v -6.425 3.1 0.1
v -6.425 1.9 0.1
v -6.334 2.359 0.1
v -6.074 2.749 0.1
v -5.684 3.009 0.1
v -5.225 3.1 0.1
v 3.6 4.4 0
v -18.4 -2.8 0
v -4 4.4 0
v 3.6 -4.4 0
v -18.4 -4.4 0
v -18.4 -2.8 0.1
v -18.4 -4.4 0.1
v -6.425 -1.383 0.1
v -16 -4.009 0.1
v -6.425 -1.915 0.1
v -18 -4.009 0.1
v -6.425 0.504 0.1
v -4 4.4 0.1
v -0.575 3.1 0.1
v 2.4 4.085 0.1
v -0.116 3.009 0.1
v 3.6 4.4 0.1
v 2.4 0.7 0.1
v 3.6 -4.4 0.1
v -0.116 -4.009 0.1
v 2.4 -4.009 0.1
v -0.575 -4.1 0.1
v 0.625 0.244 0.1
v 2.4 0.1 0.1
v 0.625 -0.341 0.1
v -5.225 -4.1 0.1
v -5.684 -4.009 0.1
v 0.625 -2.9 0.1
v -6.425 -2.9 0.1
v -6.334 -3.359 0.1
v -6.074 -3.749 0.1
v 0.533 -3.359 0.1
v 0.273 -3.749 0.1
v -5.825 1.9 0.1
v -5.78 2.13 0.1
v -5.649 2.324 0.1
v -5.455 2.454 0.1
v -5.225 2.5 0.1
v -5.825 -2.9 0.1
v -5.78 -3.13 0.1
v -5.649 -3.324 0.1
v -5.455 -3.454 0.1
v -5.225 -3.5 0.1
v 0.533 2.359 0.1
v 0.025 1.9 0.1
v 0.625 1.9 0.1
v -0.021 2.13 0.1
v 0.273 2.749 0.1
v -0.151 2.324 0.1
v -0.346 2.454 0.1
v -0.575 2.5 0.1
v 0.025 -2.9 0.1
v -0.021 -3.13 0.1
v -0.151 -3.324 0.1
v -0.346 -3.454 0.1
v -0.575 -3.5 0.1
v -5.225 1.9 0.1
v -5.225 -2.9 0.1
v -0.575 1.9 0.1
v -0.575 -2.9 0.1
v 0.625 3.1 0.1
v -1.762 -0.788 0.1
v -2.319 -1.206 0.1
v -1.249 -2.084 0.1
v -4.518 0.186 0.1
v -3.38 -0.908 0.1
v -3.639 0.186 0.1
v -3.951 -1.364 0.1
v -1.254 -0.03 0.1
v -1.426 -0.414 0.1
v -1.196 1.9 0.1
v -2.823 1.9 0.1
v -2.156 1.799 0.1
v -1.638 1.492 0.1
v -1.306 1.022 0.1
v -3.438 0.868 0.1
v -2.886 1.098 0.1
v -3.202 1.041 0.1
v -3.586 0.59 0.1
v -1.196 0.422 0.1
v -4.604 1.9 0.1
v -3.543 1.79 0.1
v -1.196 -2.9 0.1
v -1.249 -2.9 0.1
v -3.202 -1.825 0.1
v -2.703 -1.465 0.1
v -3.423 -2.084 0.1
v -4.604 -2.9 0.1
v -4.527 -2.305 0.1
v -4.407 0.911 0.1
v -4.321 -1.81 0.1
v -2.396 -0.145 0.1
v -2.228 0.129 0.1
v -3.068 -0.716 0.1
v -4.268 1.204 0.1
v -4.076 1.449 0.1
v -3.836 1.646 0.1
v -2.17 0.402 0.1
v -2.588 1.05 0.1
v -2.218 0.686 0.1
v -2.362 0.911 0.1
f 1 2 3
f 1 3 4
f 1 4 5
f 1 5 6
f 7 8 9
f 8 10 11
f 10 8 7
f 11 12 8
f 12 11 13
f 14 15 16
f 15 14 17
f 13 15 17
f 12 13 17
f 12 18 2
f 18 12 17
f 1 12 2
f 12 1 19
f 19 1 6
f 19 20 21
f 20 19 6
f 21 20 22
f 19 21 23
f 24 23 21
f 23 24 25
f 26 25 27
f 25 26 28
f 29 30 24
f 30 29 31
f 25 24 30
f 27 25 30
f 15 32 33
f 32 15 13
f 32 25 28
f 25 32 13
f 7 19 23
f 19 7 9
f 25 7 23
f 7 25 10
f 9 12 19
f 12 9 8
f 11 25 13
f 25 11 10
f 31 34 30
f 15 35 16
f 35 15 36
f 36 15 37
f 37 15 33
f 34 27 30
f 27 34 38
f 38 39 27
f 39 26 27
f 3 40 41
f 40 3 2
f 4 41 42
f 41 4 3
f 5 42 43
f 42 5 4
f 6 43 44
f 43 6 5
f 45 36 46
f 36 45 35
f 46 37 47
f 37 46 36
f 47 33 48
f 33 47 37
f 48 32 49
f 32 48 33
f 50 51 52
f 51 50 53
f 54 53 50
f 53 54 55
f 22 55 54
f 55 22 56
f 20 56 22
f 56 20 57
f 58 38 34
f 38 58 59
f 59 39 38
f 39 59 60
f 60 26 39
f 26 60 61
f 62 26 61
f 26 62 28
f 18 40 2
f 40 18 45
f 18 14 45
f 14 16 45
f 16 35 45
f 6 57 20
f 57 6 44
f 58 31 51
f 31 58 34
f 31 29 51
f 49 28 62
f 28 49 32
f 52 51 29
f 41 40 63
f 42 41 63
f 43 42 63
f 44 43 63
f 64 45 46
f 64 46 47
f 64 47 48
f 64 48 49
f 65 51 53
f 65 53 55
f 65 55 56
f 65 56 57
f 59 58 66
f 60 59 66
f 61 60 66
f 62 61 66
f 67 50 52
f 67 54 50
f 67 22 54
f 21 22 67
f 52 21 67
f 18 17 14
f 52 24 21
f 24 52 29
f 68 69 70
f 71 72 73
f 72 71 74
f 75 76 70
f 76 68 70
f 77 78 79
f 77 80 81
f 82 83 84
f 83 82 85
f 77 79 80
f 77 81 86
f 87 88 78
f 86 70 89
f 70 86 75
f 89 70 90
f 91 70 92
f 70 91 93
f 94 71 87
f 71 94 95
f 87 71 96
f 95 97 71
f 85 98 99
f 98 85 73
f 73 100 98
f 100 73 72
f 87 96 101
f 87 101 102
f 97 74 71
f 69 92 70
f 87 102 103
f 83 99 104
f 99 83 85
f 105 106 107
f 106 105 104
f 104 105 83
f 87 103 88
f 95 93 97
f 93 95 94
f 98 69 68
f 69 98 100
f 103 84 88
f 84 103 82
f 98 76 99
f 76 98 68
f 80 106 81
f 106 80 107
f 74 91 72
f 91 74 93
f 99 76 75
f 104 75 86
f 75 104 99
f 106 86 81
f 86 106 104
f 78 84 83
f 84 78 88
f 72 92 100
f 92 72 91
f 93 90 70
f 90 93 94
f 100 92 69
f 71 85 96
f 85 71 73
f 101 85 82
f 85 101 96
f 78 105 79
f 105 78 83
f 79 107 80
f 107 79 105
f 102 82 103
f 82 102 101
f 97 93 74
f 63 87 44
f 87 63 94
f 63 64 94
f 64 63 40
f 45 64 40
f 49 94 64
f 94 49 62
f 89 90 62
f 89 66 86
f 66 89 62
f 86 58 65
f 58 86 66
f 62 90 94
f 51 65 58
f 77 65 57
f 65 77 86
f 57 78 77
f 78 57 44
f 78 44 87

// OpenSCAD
// file: ../p/1-4ndis.scad
use <../lib.scad>
function ldraw_lib__1_4ndis() = [
// 0 Disc Negative 0.25
// 0 Name: 1-4ndis.dat
// 0 Author: James Jessiman
// 0 !LDRAW_ORG Primitive UPDATE 2012-01
// 0 !LICENSE Licensed under CC BY 2.0 and CC BY 4.0 : see CAreadme.txt
// 
// 0 BFC CERTIFY CCW
  [0,"BFC","CERTIFY"],
  [0,"BFC","CCW"],
// 
// 0 !HISTORY 2002-03-23 [sbliss] Added BFC Statement
// 0 !HISTORY 2002-04-25 [PTadmin] Official Update 2002-02
// 0 !HISTORY 2007-06-22 [PTadmin] Header formatted for Contributor Agreement
// 0 !HISTORY 2008-07-01 [PTadmin] Official Update 2008-01
// 0 !HISTORY 2012-02-16 [Philo] Changed to CCW
// 0 !HISTORY 2012-03-30 [PTadmin] Official Update 2012-01
// 
// 
// 3 16 0.9239 0 0.3827 1 0 0 1 0 1
  [3,16,0.9239,0,0.3827,1,0,0,1,0,1],
// 3 16 0.7071 0 0.7071 0.9239 0 0.3827 1 0 1
  [3,16,0.7071,0,0.7071,0.9239,0,0.3827,1,0,1],
// 3 16 0.3827 0 0.9239 0.7071 0 0.7071 1 0 1
  [3,16,0.3827,0,0.9239,0.7071,0,0.7071,1,0,1],
// 3 16 0 0 1 0.3827 0 0.9239 1 0 1
  [3,16,0,0,1,0.3827,0,0.9239,1,0,1],
];
module ldraw_lib__1_4ndis(step=0, col=false, unit=2/5, alt=false, line=0.2, solid=!$preview)
    makepoly(ldraw_lib__1_4ndis(), step=step, col=col, unit=unit, alt=alt, line=line, solid=solid);
ldraw_lib__1_4ndis(line=0.2);
// file: ../p/3-16ndis.scad
use <../lib.scad>
function ldraw_lib__3_16ndis() = [
// 0 Disc Negative 0.1875
// 0 Name: 3-16ndis.dat
// 0 Author: Guy Vivan [guyvivan]
// 0 !LDRAW_ORG Primitive UPDATE 2009-01
// 0 !LICENSE Licensed under CC BY 2.0 and CC BY 4.0 : see CAreadme.txt
// 
// 0 BFC CERTIFY CCW
  [0,"BFC","CERTIFY"],
  [0,"BFC","CCW"],
// 
// 0 !HISTORY 2009-05-02 [PTadmin] Official Update 2009-01
// 
// 
// 3 16 1 0 1 0.9239 0 0.3827 1 0 0
  [3,16,1,0,1,0.9239,0,0.3827,1,0,0],
// 3 16 1 0 1 0.7071 0 0.7071 0.9239 0 0.3827
  [3,16,1,0,1,0.7071,0,0.7071,0.9239,0,0.3827],
// 3 16 1 0 1 0.3827 0 0.9239 0.7071 0 0.7071
  [3,16,1,0,1,0.3827,0,0.9239,0.7071,0,0.7071],
// 
// 0 end of file
// 
];
module ldraw_lib__3_16ndis(step=0, col=false, unit=2/5, alt=false, line=0.2, solid=!$preview)
    makepoly(ldraw_lib__3_16ndis(), step=step, col=col, unit=unit, alt=alt, line=line, solid=solid);
ldraw_lib__3_16ndis(line=0.2);
// file: ../p/1-4ring1.scad
use <../lib.scad>
function ldraw_lib__1_4ring1() = [
// 0 Ring  1 x 0.25
// 0 Name: 1-4ring1.dat
// 0 Author: Chris Dee [cwdee]
// 0 !LDRAW_ORG Primitive UPDATE 2012-01
// 0 !LICENSE Licensed under CC BY 2.0 and CC BY 4.0 : see CAreadme.txt
// 
// 0 BFC CERTIFY CCW
  [0,"BFC","CERTIFY"],
  [0,"BFC","CCW"],
// 
// 0 !HISTORY 2000-05-07 [PTadmin] Official Update 2000-01
// 0 !HISTORY 2002-11-22 [hafhead] Added BFC statement
// 0 !HISTORY 2002-11-30 [PTadmin] Official Update 2002-05
// 0 !HISTORY 2007-06-22 [PTadmin] Header formatted for Contributor Agreement
// 0 !HISTORY 2008-07-01 [PTadmin] Official Update 2008-01
// 0 !HISTORY 2012-02-16 [Philo] Changed to CCW
// 0 !HISTORY 2012-03-30 [PTadmin] Official Update 2012-01
// 
// 
// 4 16 2 0 0 1.8478 0 0.7654 0.9239 0 0.3827 1 0 0
  [4,16,2,0,0,1.8478,0,0.7654,0.9239,0,0.3827,1,0,0],
// 4 16 1.8478 0 0.7654 1.4142 0 1.4142 0.7071 0 0.7071 0.9239 0 0.3827
  [4,16,1.8478,0,0.7654,1.4142,0,1.4142,0.7071,0,0.7071,0.9239,0,0.3827],
// 4 16 1.4142 0 1.4142 0.7654 0 1.8478 0.3827 0 0.9239 0.7071 0 0.7071
  [4,16,1.4142,0,1.4142,0.7654,0,1.8478,0.3827,0,0.9239,0.7071,0,0.7071],
// 4 16 0.7654 0 1.8478 0 0 2 0 0 1 0.3827 0 0.9239
  [4,16,0.7654,0,1.8478,0,0,2,0,0,1,0.3827,0,0.9239],
];
module ldraw_lib__1_4ring1(step=0, col=false, unit=2/5, alt=false, line=0.2, solid=!$preview)
    makepoly(ldraw_lib__1_4ring1(), step=step, col=col, unit=unit, alt=alt, line=line, solid=solid);
ldraw_lib__1_4ring1(line=0.2);
// file: ../p/1-4disc.scad
use <../lib.scad>
function ldraw_lib__1_4disc() = [
// 0 Disc 0.25
// 0 Name: 1-4disc.dat
// 0 Author: James Jessiman
// 0 !LDRAW_ORG Primitive UPDATE 2002-02
// 0 !LICENSE Licensed under CC BY 2.0 and CC BY 4.0 : see CAreadme.txt
// 
// 0 BFC CERTIFY CCW
  [0,"BFC","CERTIFY"],
  [0,"BFC","CCW"],
// 
// 0 !HISTORY 2002-03-23 [sbliss] Added BFC statement.
// 0 !HISTORY 2002-04-25 [PTadmin] Official Update 2002-02
// 0 !HISTORY 2007-06-22 [PTadmin] Header formatted for Contributor Agreement
// 0 !HISTORY 2008-07-01 [PTadmin] Official Update 2008-01
// 
// 
// 3 16 0 0 0 1 0 0 0.9239 0 0.3827
  [3,16,0,0,0,1,0,0,0.9239,0,0.3827],
// 3 16 0 0 0 0.9239 0 0.3827 0.7071 0 0.7071
  [3,16,0,0,0,0.9239,0,0.3827,0.7071,0,0.7071],
// 3 16 0 0 0 0.7071 0 0.7071 0.3827 0 0.9239
  [3,16,0,0,0,0.7071,0,0.7071,0.3827,0,0.9239],
// 3 16 0 0 0 0.3827 0 0.9239 0 0 1
  [3,16,0,0,0,0.3827,0,0.9239,0,0,1],
// 0
];
module ldraw_lib__1_4disc(step=0, col=false, unit=2/5, alt=false, line=0.2, solid=!$preview)
    makepoly(ldraw_lib__1_4disc(), step=step, col=col, unit=unit, alt=alt, line=line, solid=solid);
ldraw_lib__1_4disc(line=0.2);
// file: ../p/type-swiss721bt-bold-n2.scad
use <../lib.scad>
function ldraw_lib__type_swiss721bt_bold_n2() = [
// 0 Type Swiss721BT Number "2" Bold
// 0 Name: type-swiss721bt-bold-n2.dat
// 0 Author: Ulrich Röder [UR]
// 0 !LDRAW_ORG Primitive UPDATE 2019-01
// 0 !LICENSE Licensed under CC BY 2.0 and CC BY 4.0 : see CAreadme.txt
// 
// 0 BFC CERTIFY CCW
  [0,"BFC","CERTIFY"],
  [0,"BFC","CCW"],
// 
// 0 !HISTORY 2019-06-28 [PTadmin] Official Update 2019-01
// 
// 
// 0 // Main
// 3 16 .237 0 -.06 .121 0 -.147 .344 0 -.33
  [3,16,.237,0,-.06,.121,0,-.147,.344,0,-.33],
// 4 16 -.154 0 .143 -.337 0 .143 -.219 0 -.18 -.1 0 -.085
  [4,16,-.154,0,.143,-.337,0,.143,-.219,0,-.18,-.1,0,-.085],
// 3 16 .343 0 .098 .307 0 .018 .344 0 -.33
  [3,16,.343,0,.098,.307,0,.018,.344,0,-.33],
// 3 16 .307 0 .018 .237 0 -.06 .344 0 -.33
  [3,16,.307,0,.018,.237,0,-.06,.344,0,-.33],
// 3 16 .355 0 .5 .016 0 .5 .155 0 .479
  [3,16,.355,0,.5,.016,0,.5,.155,0,.479],
// 3 16 .355 0 .5 .263 0 .415 .332 0 .317
  [3,16,.355,0,.5,.263,0,.415,.332,0,.317],
// 4 16 -.112 0 .285 -.143 0 .227 .003 0 .333 -.063 0 .321
  [4,16,-.112,0,.285,-.143,0,.227,.003,0,.333,-.063,0,.321],
// 3 16 .355 0 .5 .155 0 .479 .263 0 .415
  [3,16,.355,0,.5,.155,0,.479,.263,0,.415],
// 3 16 .355 0 .5 .332 0 .317 .355 0 .192
  [3,16,.355,0,.5,.332,0,.317,.355,0,.192],
// 3 16 -.355 0 .5 -.134 0 .477 .016 0 .5
  [3,16,-.355,0,.5,-.134,0,.477,.016,0,.5],
// 4 16 .355 0 -.5 .355 0 .192 .343 0 .098 .344 0 -.33
  [4,16,.355,0,-.5,.355,0,.192,.343,0,.098,.344,0,-.33],
// 3 16 .355 0 -.5 .344 0 -.33 .344 0 -.5
  [3,16,.355,0,-.5,.344,0,-.33,.344,0,-.5],
// 4 16 -.109 0 -.33 .344 0 -.33 .041 0 -.201 -.063 0 -.276
  [4,16,-.109,0,-.33,.344,0,-.33,.041,0,-.201,-.063,0,-.276],
// 4 16 -.339 0 -.376 -.337 0 .143 -.355 0 .5 -.355 0 -.5
  [4,16,-.339,0,-.376,-.337,0,.143,-.355,0,.5,-.355,0,-.5],
// 3 16 -.355 0 .5 -.337 0 .143 -.314 0 .294
  [3,16,-.355,0,.5,-.337,0,.143,-.314,0,.294],
// 3 16 -.339 0 -.376 -.296 0 -.273 -.337 0 .143
  [3,16,-.339,0,-.376,-.296,0,-.273,-.337,0,.143],
// 4 16 .14 0 .131 -.143 0 .227 -.154 0 .143 .105 0 .074
  [4,16,.14,0,.131,-.143,0,.227,-.154,0,.143,.105,0,.074],
// 4 16 -.1 0 -.085 -.035 0 -.045 .105 0 .074 -.154 0 .143
  [4,16,-.1,0,-.085,-.035,0,-.045,.105,0,.074,-.154,0,.143],
// 3 16 -.355 0 .5 -.314 0 .294 -.285 0 .355
  [3,16,-.355,0,.5,-.314,0,.294,-.285,0,.355],
// 3 16 -.355 0 .5 -.285 0 .355 -.245 0 .406
  [3,16,-.355,0,.5,-.285,0,.355,-.245,0,.406],
// 3 16 -.296 0 -.273 -.219 0 -.18 -.337 0 .143
  [3,16,-.296,0,-.273,-.219,0,-.18,-.337,0,.143],
// 3 16 .121 0 -.147 .041 0 -.201 .344 0 -.33
  [3,16,.121,0,-.147,.041,0,-.201,.344,0,-.33],
// 3 16 -.355 0 .5 -.245 0 .406 -.195 0 .447
  [3,16,-.355,0,.5,-.245,0,.406,-.195,0,.447],
// 4 16 .152 0 .188 .003 0 .333 -.143 0 .227 .14 0 .131
  [4,16,.152,0,.188,.003,0,.333,-.143,0,.227,.14,0,.131],
// 4 16 .112 0 .294 .065 0 .323 .152 0 .188 .142 0 .247
  [4,16,.112,0,.294,.065,0,.323,.152,0,.188,.142,0,.247],
// 3 16 .152 0 .188 .065 0 .323 .003 0 .333
  [3,16,.152,0,.188,.065,0,.323,.003,0,.333],
// 3 16 -.355 0 .5 -.195 0 .447 -.134 0 .477
  [3,16,-.355,0,.5,-.195,0,.447,-.134,0,.477],
// 
// 0 // Black
// 4 0 -.296 0 -.273 -.339 0 -.376 -.355 0 -.5 -.109 0 -.33
  [4,0,-.296,0,-.273,-.339,0,-.376,-.355,0,-.5,-.109,0,-.33],
// 4 0 -.035 0 -.045 .121 0 -.147 .237 0 -.06 .105 0 .074
  [4,0,-.035,0,-.045,.121,0,-.147,.237,0,-.06,.105,0,.074],
// 4 0 -.134 0 .477 -.195 0 .447 -.112 0 .285 -.063 0 .321
  [4,0,-.134,0,.477,-.195,0,.447,-.112,0,.285,-.063,0,.321],
// 4 0 .237 0 -.06 .307 0 .018 .14 0 .131 .105 0 .074
  [4,0,.237,0,-.06,.307,0,.018,.14,0,.131,.105,0,.074],
// 4 0 .112 0 .294 .142 0 .247 .332 0 .317 .263 0 .415
  [4,0,.112,0,.294,.142,0,.247,.332,0,.317,.263,0,.415],
// 4 0 -.1 0 -.085 -.219 0 -.18 -.109 0 -.33 -.063 0 -.276
  [4,0,-.1,0,-.085,-.219,0,-.18,-.109,0,-.33,-.063,0,-.276],
// 3 0 .14 0 .131 .307 0 .018 .343 0 .098
  [3,0,.14,0,.131,.307,0,.018,.343,0,.098],
// 4 0 .14 0 .131 .343 0 .098 .355 0 .192 .152 0 .188
  [4,0,.14,0,.131,.343,0,.098,.355,0,.192,.152,0,.188],
// 4 0 .152 0 .188 .355 0 .192 .332 0 .317 .142 0 .247
  [4,0,.152,0,.188,.355,0,.192,.332,0,.317,.142,0,.247],
// 4 0 .003 0 .333 .016 0 .5 -.134 0 .477 -.063 0 .321
  [4,0,.003,0,.333,.016,0,.5,-.134,0,.477,-.063,0,.321],
// 4 0 -.035 0 -.045 -.1 0 -.085 -.063 0 -.276 .041 0 -.201
  [4,0,-.035,0,-.045,-.1,0,-.085,-.063,0,-.276,.041,0,-.201],
// 4 0 -.109 0 -.33 -.355 0 -.5 .344 0 -.5 .344 0 -.33
  [4,0,-.109,0,-.33,-.355,0,-.5,.344,0,-.5,.344,0,-.33],
// 3 0 -.035 0 -.045 .041 0 -.201 .121 0 -.147
  [3,0,-.035,0,-.045,.041,0,-.201,.121,0,-.147],
// 4 0 -.314 0 .294 -.337 0 .143 -.154 0 .143 -.143 0 .227
  [4,0,-.314,0,.294,-.337,0,.143,-.154,0,.143,-.143,0,.227],
// 4 0 -.112 0 .285 -.285 0 .355 -.314 0 .294 -.143 0 .227
  [4,0,-.112,0,.285,-.285,0,.355,-.314,0,.294,-.143,0,.227],
// 4 0 .003 0 .333 .065 0 .323 .155 0 .479 .016 0 .5
  [4,0,.003,0,.333,.065,0,.323,.155,0,.479,.016,0,.5],
// 4 0 .263 0 .415 .155 0 .479 .065 0 .323 .112 0 .294
  [4,0,.263,0,.415,.155,0,.479,.065,0,.323,.112,0,.294],
// 4 0 -.285 0 .355 -.112 0 .285 -.195 0 .447 -.245 0 .406
  [4,0,-.285,0,.355,-.112,0,.285,-.195,0,.447,-.245,0,.406],
// 3 0 -.296 0 -.273 -.109 0 -.33 -.219 0 -.18
  [3,0,-.296,0,-.273,-.109,0,-.33,-.219,0,-.18],
];
module ldraw_lib__type_swiss721bt_bold_n2(step=0, col=false, unit=2/5, alt=false, line=0.2, solid=!$preview)
    makepoly(ldraw_lib__type_swiss721bt_bold_n2(), step=step, col=col, unit=unit, alt=alt, line=line, solid=solid);
ldraw_lib__type_swiss721bt_bold_n2(line=0.2);
// file: s/821435as03.scad
use <../../lib.scad>
use <../../p/1-4ndis.scad>
function ldraw_lib__s__821435as03() = [
// 0 ~Sticker Sloped Body for Racing Number
// 0 Name: s\821435as03.dat
// 0 Author: Ulrich Röder [UR]
// 0 !LDRAW_ORG Subpart UPDATE 2019-01
// 0 !LICENSE Licensed under CC BY 2.0 and CC BY 4.0 : see CAreadme.txt
// 
// 0 BFC CERTIFY CCW
  [0,"BFC","CERTIFY"],
  [0,"BFC","CCW"],
// 
// 0 !HISTORY 2019-06-28 [PTadmin] Official Update 2019-01
// 
// 
// 0 // Main
// 1 16 13.063 -.25 4.75 3 0 0 0 1 0 0 0 3 1-4ndis.dat
  [1,16,13.063,-.25,4.75,3,0,0,0,1,0,0,0,3, ldraw_lib__1_4ndis()],
// 3 16 10 0 11 46 0 -7 -9 0 11
  [3,16,10,0,11,46,0,-7,-9,0,11],
// 4 16 -9 0 -11 -9 0 11 46 0 -7 46 0 -11
  [4,16,-9,0,-11,-9,0,11,46,0,-7,46,0,-11],
// 4 16 46 -.25 -11 46 0 -11 46 0 -7 46 -.25 -7
  [4,16,46,-.25,-11,46,0,-11,46,0,-7,46,-.25,-7],
// 4 16 16.063 -.25 -4.788 40 -.25 -10.022 45 -.25 -10.022 16.063 -.25 -3.458
  [4,16,16.063,-.25,-4.788,40,-.25,-10.022,45,-.25,-10.022,16.063,-.25,-3.458],
// 3 16 45 -.25 -10.022 40 -.25 -10.022 46 -.25 -11
  [3,16,45,-.25,-10.022,40,-.25,-10.022,46,-.25,-11],
// 3 16 45 -.25 -10.022 46 -.25 -11 46 -.25 -7
  [3,16,45,-.25,-10.022,46,-.25,-11,46,-.25,-7],
// 4 16 16.063 -.25 4.75 16.063 -.25 1.261 45 -.25 -10.022 46 -.25 -7
  [4,16,16.063,-.25,4.75,16.063,-.25,1.261,45,-.25,-10.022,46,-.25,-7],
// 3 16 16.063 -.25 4.75 46 -.25 -7 16.063 -.25 7.75
  [3,16,16.063,-.25,4.75,46,-.25,-7,16.063,-.25,7.75],
// 3 16 10 -.25 11 16.063 -.25 7.75 46 -.25 -7
  [3,16,10,-.25,11,16.063,-.25,7.75,46,-.25,-7],
// 3 16 13.063 -.25 7.75 16.063 -.25 7.75 10 -.25 11
  [3,16,13.063,-.25,7.75,16.063,-.25,7.75,10,-.25,11],
// 4 16 -6 -.25 10.213 1.438 -.25 7.75 13.063 -.25 7.75 10 -.25 11
  [4,16,-6,-.25,10.213,1.438,-.25,7.75,13.063,-.25,7.75,10,-.25,11],
// 3 16 .2899 -.25 7.5217 1.438 -.25 7.75 -6 -.25 10.213
  [3,16,.2899,-.25,7.5217,1.438,-.25,7.75,-6,-.25,10.213],
// 3 16 -9 -.25 11 -6 -.25 10.213 10 -.25 11
  [3,16,-9,-.25,11,-6,-.25,10.213,10,-.25,11],
// 4 16 -9 -.25 -11 -6 -.25 1.75 -6 -.25 10.213 -9 -.25 11
  [4,16,-9,-.25,-11,-6,-.25,1.75,-6,-.25,10.213,-9,-.25,11],
// 4 16 1.438 -.25 -10.25 .2899 -.25 -10.0217 -6 -.25 -10.022 -9 -.25 -11
  [4,16,1.438,-.25,-10.25,.2899,-.25,-10.0217,-6,-.25,-10.022,-9,-.25,-11],
// 4 16 -1.563 -.25 .61 -6 -.25 1.75 -6 -.25 .25 -1.563 -.25 -.853
  [4,16,-1.563,-.25,.61,-6,-.25,1.75,-6,-.25,.25,-1.563,-.25,-.853],
// 3 16 -6 -.25 .25 -6 -.25 1.75 -9 -.25 -11
  [3,16,-6,-.25,.25,-6,-.25,1.75,-9,-.25,-11],
// 3 16 -6 -.25 .25 -9 -.25 -11 -6 -.25 -10.022
  [3,16,-6,-.25,.25,-9,-.25,-11,-6,-.25,-10.022],
// 4 16 40 -.25 -10.022 14.2111 -.25 -10.0217 13.063 -.25 -10.25 46 -.25 -11
  [4,16,40,-.25,-10.022,14.2111,-.25,-10.0217,13.063,-.25,-10.25,46,-.25,-11],
// 4 16 1.438 -.25 -10.25 -9 -.25 -11 46 -.25 -11 13.063 -.25 -10.25
  [4,16,1.438,-.25,-10.25,-9,-.25,-11,46,-.25,-11,13.063,-.25,-10.25],
// 4 16 -9 -.25 11 10 -.25 11 10 0 11 -9 0 11
  [4,16,-9,-.25,11,10,-.25,11,10,0,11,-9,0,11],
// 4 16 -9 0 11 -9 0 -11 -9 -.25 -11 -9 -.25 11
  [4,16,-9,0,11,-9,0,-11,-9,-.25,-11,-9,-.25,11],
// 4 16 10 -.25 11 46 -.25 -7 46 0 -7 10 0 11
  [4,16,10,-.25,11,46,-.25,-7,46,0,-7,10,0,11],
// 4 16 46 0 -11 46 -.25 -11 -9 -.25 -11 -9 0 -11
  [4,16,46,0,-11,46,-.25,-11,-9,-.25,-11,-9,0,-11],
];
module ldraw_lib__s__821435as03(step=0, col=false, unit=2/5, alt=false, line=0.2, solid=!$preview)
    makepoly(ldraw_lib__s__821435as03(), step=step, col=col, unit=unit, alt=alt, line=line, solid=solid);
ldraw_lib__s__821435as03(line=0.2);
// file: s/821435as02.scad
use <../../lib.scad>
use <../../p/3-16ndis.scad>
function ldraw_lib__s__821435as02() = [
// 0 ~Sticker Upper Triangle with Cutout for Racing Number
// 0 Name: s\821435as02.dat
// 0 Author: Ulrich Röder [UR]
// 0 !LDRAW_ORG Subpart UPDATE 2019-01
// 0 !LICENSE Licensed under CC BY 2.0 and CC BY 4.0 : see CAreadme.txt
// 
// 0 BFC CERTIFY CCW
  [0,"BFC","CERTIFY"],
  [0,"BFC","CCW"],
// 
// 0 !HISTORY 2019-06-28 [PTadmin] Official Update 2019-01
// 
// 
// 0 // Main
// 1 16 1.438 -.25 4.75 -3 0 0 0 1 0 0 0 3 3-16ndis.dat
  [1,16,1.438,-.25,4.75,-3,0,0,0,1,0,0,0,3, ldraw_lib__3_16ndis()],
// 3 16 -1.562 -.25 7.75 .2899 -.25 7.5217 -6 -.25 10.213
  [3,16,-1.562,-.25,7.75,.2899,-.25,7.5217,-6,-.25,10.213],
// 3 16 -1.562 -.25 7.75 -6 -.25 10.213 -1.562 -.25 4.75
  [3,16,-1.562,-.25,7.75,-6,-.25,10.213,-1.562,-.25,4.75],
// 3 16 16.063 -.25 -3.458 45 -.25 -10.022 16.063 -.25 1.261
  [3,16,16.063,-.25,-3.458,45,-.25,-10.022,16.063,-.25,1.261],
// 4 16 -6 -.25 1.75 -1.563 -.25 .61 -1.562 -.25 4.75 -6 -.25 10.213
  [4,16,-6,-.25,1.75,-1.563,-.25,.61,-1.562,-.25,4.75,-6,-.25,10.213],
];
module ldraw_lib__s__821435as02(step=0, col=false, unit=2/5, alt=false, line=0.2, solid=!$preview)
    makepoly(ldraw_lib__s__821435as02(), step=step, col=col, unit=unit, alt=alt, line=line, solid=solid);
ldraw_lib__s__821435as02(line=0.2);
// file: s/821435as01.scad
use <../../lib.scad>
use <../../p/1-4disc.scad>
use <../../p/1-4ring1.scad>
function ldraw_lib__s__821435as01() = [
// 0 ~Sticker Lower Triangle and Racing Number Frame
// 0 Name: s\821435as01.dat
// 0 Author: Ulrich Röder [UR]
// 0 !LDRAW_ORG Subpart UPDATE 2019-01
// 0 !LICENSE Licensed under CC BY 2.0 and CC BY 4.0 : see CAreadme.txt
// 
// 0 BFC CERTIFY CCW
  [0,"BFC","CERTIFY"],
  [0,"BFC","CCW"],
// 
// 0 !HISTORY 2019-06-28 [PTadmin] Official Update 2019-01
// 
// 
// 0 // Main
// 
// 3 16 -6 -0.25 0.25 -1.562 -0.25 -7.25 -1.563 -0.25 -0.853
  [3,16,-6,-0.25,0.25,-1.562,-0.25,-7.25,-1.563,-0.25,-0.853],
// 3 16 16.063 -0.25 -4.788 16.063 -0.25 -7.25 40 -0.25 -10.022
  [3,16,16.063,-0.25,-4.788,16.063,-0.25,-7.25,40,-0.25,-10.022],
// 3 16 15.8347 -0.25 -8.3981 40 -0.25 -10.022 16.063 -0.25 -7.25
  [3,16,15.8347,-0.25,-8.3981,40,-0.25,-10.022,16.063,-0.25,-7.25],
// 3 16 15.1843 -0.25 -9.3713 40 -0.25 -10.022 15.8347 -0.25 -8.3981
  [3,16,15.1843,-0.25,-9.3713,40,-0.25,-10.022,15.8347,-0.25,-8.3981],
// 3 16 14.2111 -0.25 -10.0217 40 -0.25 -10.022 15.1843 -0.25 -9.3713
  [3,16,14.2111,-0.25,-10.0217,40,-0.25,-10.022,15.1843,-0.25,-9.3713],
// 4 16 -6 -0.25 0.25 -6 -0.25 -10.022 -1.3337 -0.25 -8.3981 -1.562 -0.25 -7.25
  [4,16,-6,-0.25,0.25,-6,-0.25,-10.022,-1.3337,-0.25,-8.3981,-1.562,-0.25,-7.25],
// 3 16 -6 -0.25 -10.022 -0.6833 -0.25 -9.3713 -1.3337 -0.25 -8.3981
  [3,16,-6,-0.25,-10.022,-0.6833,-0.25,-9.3713,-1.3337,-0.25,-8.3981],
// 3 16 -6 -0.25 -10.022 0.2899 -0.25 -10.0217 -0.6833 -0.25 -9.3713
  [3,16,-6,-0.25,-10.022,0.2899,-0.25,-10.0217,-0.6833,-0.25,-9.3713],
// 
// 0 // Black
// 1 0 13.063 -.25 4.75 1.5 0 0 0 1 0 0 0 1.5 1-4ring1.dat
  [1,0,13.063,-.25,4.75,1.5,0,0,0,1,0,0,0,1.5, ldraw_lib__1_4ring1()],
// 1 0 13.063 -.25 -7.25 1.5 0 0 0 1 0 0 0 -1.5 1-4ring1.dat
  [1,0,13.063,-.25,-7.25,1.5,0,0,0,1,0,0,0,-1.5, ldraw_lib__1_4ring1()],
// 1 0 1.438 -.25 4.75 -1.5 0 0 0 1 0 0 0 1.5 1-4ring1.dat
  [1,0,1.438,-.25,4.75,-1.5,0,0,0,1,0,0,0,1.5, ldraw_lib__1_4ring1()],
// 1 0 1.438 -.25 -7.25 -1.5 0 0 0 1 0 0 0 -1.5 1-4ring1.dat
  [1,0,1.438,-.25,-7.25,-1.5,0,0,0,1,0,0,0,-1.5, ldraw_lib__1_4ring1()],
// 4 0 14.563 -0.25 4.75 14.563 -0.25 -7.25 16.063 -0.25 1.261 16.063 -0.25 4.75
  [4,0,14.563,-0.25,4.75,14.563,-0.25,-7.25,16.063,-0.25,1.261,16.063,-0.25,4.75],
// 3 0 14.563 -0.25 -7.25 16.063 -0.25 -3.458 16.063 -0.25 1.261
  [3,0,14.563,-0.25,-7.25,16.063,-0.25,-3.458,16.063,-0.25,1.261],
// 3 0 14.563 -0.25 -7.25 16.063 -0.25 -4.788 16.063 -0.25 -3.458
  [3,0,14.563,-0.25,-7.25,16.063,-0.25,-4.788,16.063,-0.25,-3.458],
// 3 0 14.563 -0.25 -7.25 16.063 -0.25 -7.25 16.063 -0.25 -4.788
  [3,0,14.563,-0.25,-7.25,16.063,-0.25,-7.25,16.063,-0.25,-4.788],
// 4 0 13.063 -0.25 6.25 13.063 -0.25 7.75 1.438 -0.25 7.75 1.438 -0.25 6.25
  [4,0,13.063,-0.25,6.25,13.063,-0.25,7.75,1.438,-0.25,7.75,1.438,-0.25,6.25],
// 4 0 -0.062 -0.25 4.75 -1.563 -0.25 -0.853 -1.562 -0.25 -7.25 -0.062 -0.25 -7.25
  [4,0,-0.062,-0.25,4.75,-1.563,-0.25,-0.853,-1.562,-0.25,-7.25,-0.062,-0.25,-7.25],
// 3 0 -0.062 -0.25 4.75 -1.563 -0.25 0.61 -1.563 -0.25 -0.853
  [3,0,-0.062,-0.25,4.75,-1.563,-0.25,0.61,-1.563,-0.25,-0.853],
// 4 0 1.438 -0.25 -10.25 13.063 -0.25 -10.25 13.063 -0.25 -8.75 1.438 -0.25 -8.75
  [4,0,1.438,-0.25,-10.25,13.063,-0.25,-10.25,13.063,-0.25,-8.75,1.438,-0.25,-8.75],
// 3 0 -1.563 -0.25 0.61 -0.062 -0.25 4.75 -1.562 -0.25 4.75
  [3,0,-1.563,-0.25,0.61,-0.062,-0.25,4.75,-1.562,-0.25,4.75],
// 
// 0 // White
// 1 15 13.063 -.25 4.75 1.5 0 0 0 1 0 0 0 1.5 1-4disc.dat
  [1,15,13.063,-.25,4.75,1.5,0,0,0,1,0,0,0,1.5, ldraw_lib__1_4disc()],
// 1 15 13.063 -.25 -7.25 1.5 0 0 0 1 0 0 0 -1.5 1-4disc.dat
  [1,15,13.063,-.25,-7.25,1.5,0,0,0,1,0,0,0,-1.5, ldraw_lib__1_4disc()],
// 1 15 1.438 -.25 4.75 -1.5 0 0 0 1 0 0 0 1.5 1-4disc.dat
  [1,15,1.438,-.25,4.75,-1.5,0,0,0,1,0,0,0,1.5, ldraw_lib__1_4disc()],
// 1 15 1.438 -.25 -7.25 -1.5 0 0 0 1 0 0 0 -1.5 1-4disc.dat
  [1,15,1.438,-.25,-7.25,-1.5,0,0,0,1,0,0,0,-1.5, ldraw_lib__1_4disc()],
];
module ldraw_lib__s__821435as01(step=0, col=false, unit=2/5, alt=false, line=0.2, solid=!$preview)
    makepoly(ldraw_lib__s__821435as01(), step=step, col=col, unit=unit, alt=alt, line=line, solid=solid);
ldraw_lib__s__821435as01(line=0.2);
// file: 821435d.scad
use <../lib.scad>
use <s/821435as01.scad>
use <s/821435as02.scad>
use <s/821435as03.scad>
use <../p/type-swiss721bt-bold-n2.scad>
function ldraw_lib__821435d() = [
// 0 Sticker with White/Black Triangles and Racing Number "2", Left
// 0 Name: 821435d.dat
// 0 Author: Ulrich Röder [UR]
// 0 !LDRAW_ORG Part UPDATE 2019-01
// 0 !LICENSE Licensed under CC BY 2.0 and CC BY 4.0 : see CAreadme.txt
// 
// 0 BFC CERTIFY CCW
  [0,"BFC","CERTIFY"],
  [0,"BFC","CCW"],
// 
// 0 !KEYWORDS cup, Racers, Set 6539
// 
// 0 !HISTORY 2019-06-28 [PTadmin] Official Update 2019-01
// 
// 
// 0 // Main
// 
// 1 16 0 0 0 -1 0 0 0 1 0 0 0 1 s\821435as03.dat
  [1,16,0,0,0,-1,0,0,0,1,0,0,0,1, ldraw_lib__s__821435as03()],
// 
// 0 // Black
// 1 0 0 0 0 -1 0 0 0 1 0 0 0 1 s\821435as01.dat
  [1,0,0,0,0,-1,0,0,0,1,0,0,0,1, ldraw_lib__s__821435as01()],
// 
// 0 // White
// 1 15 0 0 0 -1 0 0 0 1 0 0 0 1 s\821435as02.dat
  [1,15,0,0,0,-1,0,0,0,1,0,0,0,1, ldraw_lib__s__821435as02()],
// 1 15 -7.25 -.25 -1.25 12 0 0 0 1 0 0 0 12 type-swiss721bt-bold-n2.dat
  [1,15,-7.25,-.25,-1.25,12,0,0,0,1,0,0,0,12, ldraw_lib__type_swiss721bt_bold_n2()],
// 4 15 -11.51 -.25 -7.25 -11.51 -.25 4.75 -13.063 -.25 6.25 -13.063 -.25 4.75
  [4,15,-11.51,-.25,-7.25,-11.51,-.25,4.75,-13.063,-.25,6.25,-13.063,-.25,4.75],
// 4 15 -13.063 -.25 4.75 -14.563 -.25 4.75 -13.063 -.25 -7.25 -11.51 -.25 -7.25
  [4,15,-13.063,-.25,4.75,-14.563,-.25,4.75,-13.063,-.25,-7.25,-11.51,-.25,-7.25],
// 3 15 -14.563 -.25 -7.25 -13.063 -.25 -7.25 -14.563 -.25 4.75
  [3,15,-14.563,-.25,-7.25,-13.063,-.25,-7.25,-14.563,-.25,4.75],
// 4 15 -1.438 -.25 -8.75 -11.51 -.25 -7.25 -13.063 -.25 -7.25 -13.063 -.25 -8.75
  [4,15,-1.438,-.25,-8.75,-11.51,-.25,-7.25,-13.063,-.25,-7.25,-13.063,-.25,-8.75],
// 3 15 -2.99 -.25 -7.25 -3.122 -.25 -7.25 -1.438 -.25 -8.75
  [3,15,-2.99,-.25,-7.25,-3.122,-.25,-7.25,-1.438,-.25,-8.75],
// 4 15 -2.99 -.25 1.054 -2.99 -.25 -7.25 -1.438 -.25 -8.75 -1.438 -.25 -7.25
  [4,15,-2.99,-.25,1.054,-2.99,-.25,-7.25,-1.438,-.25,-8.75,-1.438,-.25,-7.25],
// 4 15 -1.438 -.25 4.75 -2.99 -.25 1.054 -1.438 -.25 -7.25 .062 -.25 -7.25
  [4,15,-1.438,-.25,4.75,-2.99,-.25,1.054,-1.438,-.25,-7.25,.062,-.25,-7.25],
// 3 15 -1.438 -.25 -8.75 -3.122 -.25 -7.25 -11.51 -.25 -7.25
  [3,15,-1.438,-.25,-8.75,-3.122,-.25,-7.25,-11.51,-.25,-7.25],
// 3 15 .062 -.25 4.75 -1.438 -.25 4.75 .062 -.25 -7.25
  [3,15,.062,-.25,4.75,-1.438,-.25,4.75,.062,-.25,-7.25],
// 4 15 -1.438 -.25 6.25 -2.99 -.25 4.75 -2.99 -.25 1.054 -1.438 -.25 4.75
  [4,15,-1.438,-.25,6.25,-2.99,-.25,4.75,-2.99,-.25,1.054,-1.438,-.25,4.75],
// 4 15 -13.063 -.25 6.25 -7.058 -.25 4.75 -2.99 -.25 4.75 -1.438 -.25 6.25
  [4,15,-13.063,-.25,6.25,-7.058,-.25,4.75,-2.99,-.25,4.75,-1.438,-.25,6.25],
// 3 15 -7.058 -.25 4.75 -13.063 -.25 6.25 -11.51 -.25 4.75
  [3,15,-7.058,-.25,4.75,-13.063,-.25,6.25,-11.51,-.25,4.75],
];
module ldraw_lib__821435d(step=0, col=false, unit=2/5, alt=false, line=0.2, solid=!$preview)
    makepoly(ldraw_lib__821435d(), step=step, col=col, unit=unit, alt=alt, line=line, solid=solid);
ldraw_lib__821435d(line=0.2);
// main file
use <../lib.scad>
use <821435d.scad>
function ldraw_lib__169675h() = [
// 0 =Sticker with White/Black Triangles and Racing Number "2", Left
// 0 Name: 169675h.dat
// 0 Author: [PTadmin]
// 0 !LDRAW_ORG Part Alias UPDATE 2019-02
// 0 !LICENSE Licensed under CC BY 4.0 : see CAreadme.txt
// 
// 0 BFC CERTIFY CCW
  [0,"BFC","CERTIFY"],
  [0,"BFC","CCW"],
// 
// 0 !KEYWORDS Cargo, container, Set 4555
// 
// 0 !HISTORY 2019-09-09 [PTadmin] Official Update 2019-02
// 
// 
// 0 // Alias of 821435d
// 
// 1 16 0 0 0 1 0 0 0 1 0 0 0 1 821435d.dat
  [1,16,0,0,0,1,0,0,0,1,0,0,0,1, ldraw_lib__821435d()],
];
module ldraw_lib__169675h(step=0, col=false, unit=2/5, alt=false, line=0.2, solid=!$preview)
    makepoly(ldraw_lib__169675h(), step=step, col=col, unit=unit, alt=alt, line=line, solid=solid);
ldraw_lib__169675h(line=0.2);
